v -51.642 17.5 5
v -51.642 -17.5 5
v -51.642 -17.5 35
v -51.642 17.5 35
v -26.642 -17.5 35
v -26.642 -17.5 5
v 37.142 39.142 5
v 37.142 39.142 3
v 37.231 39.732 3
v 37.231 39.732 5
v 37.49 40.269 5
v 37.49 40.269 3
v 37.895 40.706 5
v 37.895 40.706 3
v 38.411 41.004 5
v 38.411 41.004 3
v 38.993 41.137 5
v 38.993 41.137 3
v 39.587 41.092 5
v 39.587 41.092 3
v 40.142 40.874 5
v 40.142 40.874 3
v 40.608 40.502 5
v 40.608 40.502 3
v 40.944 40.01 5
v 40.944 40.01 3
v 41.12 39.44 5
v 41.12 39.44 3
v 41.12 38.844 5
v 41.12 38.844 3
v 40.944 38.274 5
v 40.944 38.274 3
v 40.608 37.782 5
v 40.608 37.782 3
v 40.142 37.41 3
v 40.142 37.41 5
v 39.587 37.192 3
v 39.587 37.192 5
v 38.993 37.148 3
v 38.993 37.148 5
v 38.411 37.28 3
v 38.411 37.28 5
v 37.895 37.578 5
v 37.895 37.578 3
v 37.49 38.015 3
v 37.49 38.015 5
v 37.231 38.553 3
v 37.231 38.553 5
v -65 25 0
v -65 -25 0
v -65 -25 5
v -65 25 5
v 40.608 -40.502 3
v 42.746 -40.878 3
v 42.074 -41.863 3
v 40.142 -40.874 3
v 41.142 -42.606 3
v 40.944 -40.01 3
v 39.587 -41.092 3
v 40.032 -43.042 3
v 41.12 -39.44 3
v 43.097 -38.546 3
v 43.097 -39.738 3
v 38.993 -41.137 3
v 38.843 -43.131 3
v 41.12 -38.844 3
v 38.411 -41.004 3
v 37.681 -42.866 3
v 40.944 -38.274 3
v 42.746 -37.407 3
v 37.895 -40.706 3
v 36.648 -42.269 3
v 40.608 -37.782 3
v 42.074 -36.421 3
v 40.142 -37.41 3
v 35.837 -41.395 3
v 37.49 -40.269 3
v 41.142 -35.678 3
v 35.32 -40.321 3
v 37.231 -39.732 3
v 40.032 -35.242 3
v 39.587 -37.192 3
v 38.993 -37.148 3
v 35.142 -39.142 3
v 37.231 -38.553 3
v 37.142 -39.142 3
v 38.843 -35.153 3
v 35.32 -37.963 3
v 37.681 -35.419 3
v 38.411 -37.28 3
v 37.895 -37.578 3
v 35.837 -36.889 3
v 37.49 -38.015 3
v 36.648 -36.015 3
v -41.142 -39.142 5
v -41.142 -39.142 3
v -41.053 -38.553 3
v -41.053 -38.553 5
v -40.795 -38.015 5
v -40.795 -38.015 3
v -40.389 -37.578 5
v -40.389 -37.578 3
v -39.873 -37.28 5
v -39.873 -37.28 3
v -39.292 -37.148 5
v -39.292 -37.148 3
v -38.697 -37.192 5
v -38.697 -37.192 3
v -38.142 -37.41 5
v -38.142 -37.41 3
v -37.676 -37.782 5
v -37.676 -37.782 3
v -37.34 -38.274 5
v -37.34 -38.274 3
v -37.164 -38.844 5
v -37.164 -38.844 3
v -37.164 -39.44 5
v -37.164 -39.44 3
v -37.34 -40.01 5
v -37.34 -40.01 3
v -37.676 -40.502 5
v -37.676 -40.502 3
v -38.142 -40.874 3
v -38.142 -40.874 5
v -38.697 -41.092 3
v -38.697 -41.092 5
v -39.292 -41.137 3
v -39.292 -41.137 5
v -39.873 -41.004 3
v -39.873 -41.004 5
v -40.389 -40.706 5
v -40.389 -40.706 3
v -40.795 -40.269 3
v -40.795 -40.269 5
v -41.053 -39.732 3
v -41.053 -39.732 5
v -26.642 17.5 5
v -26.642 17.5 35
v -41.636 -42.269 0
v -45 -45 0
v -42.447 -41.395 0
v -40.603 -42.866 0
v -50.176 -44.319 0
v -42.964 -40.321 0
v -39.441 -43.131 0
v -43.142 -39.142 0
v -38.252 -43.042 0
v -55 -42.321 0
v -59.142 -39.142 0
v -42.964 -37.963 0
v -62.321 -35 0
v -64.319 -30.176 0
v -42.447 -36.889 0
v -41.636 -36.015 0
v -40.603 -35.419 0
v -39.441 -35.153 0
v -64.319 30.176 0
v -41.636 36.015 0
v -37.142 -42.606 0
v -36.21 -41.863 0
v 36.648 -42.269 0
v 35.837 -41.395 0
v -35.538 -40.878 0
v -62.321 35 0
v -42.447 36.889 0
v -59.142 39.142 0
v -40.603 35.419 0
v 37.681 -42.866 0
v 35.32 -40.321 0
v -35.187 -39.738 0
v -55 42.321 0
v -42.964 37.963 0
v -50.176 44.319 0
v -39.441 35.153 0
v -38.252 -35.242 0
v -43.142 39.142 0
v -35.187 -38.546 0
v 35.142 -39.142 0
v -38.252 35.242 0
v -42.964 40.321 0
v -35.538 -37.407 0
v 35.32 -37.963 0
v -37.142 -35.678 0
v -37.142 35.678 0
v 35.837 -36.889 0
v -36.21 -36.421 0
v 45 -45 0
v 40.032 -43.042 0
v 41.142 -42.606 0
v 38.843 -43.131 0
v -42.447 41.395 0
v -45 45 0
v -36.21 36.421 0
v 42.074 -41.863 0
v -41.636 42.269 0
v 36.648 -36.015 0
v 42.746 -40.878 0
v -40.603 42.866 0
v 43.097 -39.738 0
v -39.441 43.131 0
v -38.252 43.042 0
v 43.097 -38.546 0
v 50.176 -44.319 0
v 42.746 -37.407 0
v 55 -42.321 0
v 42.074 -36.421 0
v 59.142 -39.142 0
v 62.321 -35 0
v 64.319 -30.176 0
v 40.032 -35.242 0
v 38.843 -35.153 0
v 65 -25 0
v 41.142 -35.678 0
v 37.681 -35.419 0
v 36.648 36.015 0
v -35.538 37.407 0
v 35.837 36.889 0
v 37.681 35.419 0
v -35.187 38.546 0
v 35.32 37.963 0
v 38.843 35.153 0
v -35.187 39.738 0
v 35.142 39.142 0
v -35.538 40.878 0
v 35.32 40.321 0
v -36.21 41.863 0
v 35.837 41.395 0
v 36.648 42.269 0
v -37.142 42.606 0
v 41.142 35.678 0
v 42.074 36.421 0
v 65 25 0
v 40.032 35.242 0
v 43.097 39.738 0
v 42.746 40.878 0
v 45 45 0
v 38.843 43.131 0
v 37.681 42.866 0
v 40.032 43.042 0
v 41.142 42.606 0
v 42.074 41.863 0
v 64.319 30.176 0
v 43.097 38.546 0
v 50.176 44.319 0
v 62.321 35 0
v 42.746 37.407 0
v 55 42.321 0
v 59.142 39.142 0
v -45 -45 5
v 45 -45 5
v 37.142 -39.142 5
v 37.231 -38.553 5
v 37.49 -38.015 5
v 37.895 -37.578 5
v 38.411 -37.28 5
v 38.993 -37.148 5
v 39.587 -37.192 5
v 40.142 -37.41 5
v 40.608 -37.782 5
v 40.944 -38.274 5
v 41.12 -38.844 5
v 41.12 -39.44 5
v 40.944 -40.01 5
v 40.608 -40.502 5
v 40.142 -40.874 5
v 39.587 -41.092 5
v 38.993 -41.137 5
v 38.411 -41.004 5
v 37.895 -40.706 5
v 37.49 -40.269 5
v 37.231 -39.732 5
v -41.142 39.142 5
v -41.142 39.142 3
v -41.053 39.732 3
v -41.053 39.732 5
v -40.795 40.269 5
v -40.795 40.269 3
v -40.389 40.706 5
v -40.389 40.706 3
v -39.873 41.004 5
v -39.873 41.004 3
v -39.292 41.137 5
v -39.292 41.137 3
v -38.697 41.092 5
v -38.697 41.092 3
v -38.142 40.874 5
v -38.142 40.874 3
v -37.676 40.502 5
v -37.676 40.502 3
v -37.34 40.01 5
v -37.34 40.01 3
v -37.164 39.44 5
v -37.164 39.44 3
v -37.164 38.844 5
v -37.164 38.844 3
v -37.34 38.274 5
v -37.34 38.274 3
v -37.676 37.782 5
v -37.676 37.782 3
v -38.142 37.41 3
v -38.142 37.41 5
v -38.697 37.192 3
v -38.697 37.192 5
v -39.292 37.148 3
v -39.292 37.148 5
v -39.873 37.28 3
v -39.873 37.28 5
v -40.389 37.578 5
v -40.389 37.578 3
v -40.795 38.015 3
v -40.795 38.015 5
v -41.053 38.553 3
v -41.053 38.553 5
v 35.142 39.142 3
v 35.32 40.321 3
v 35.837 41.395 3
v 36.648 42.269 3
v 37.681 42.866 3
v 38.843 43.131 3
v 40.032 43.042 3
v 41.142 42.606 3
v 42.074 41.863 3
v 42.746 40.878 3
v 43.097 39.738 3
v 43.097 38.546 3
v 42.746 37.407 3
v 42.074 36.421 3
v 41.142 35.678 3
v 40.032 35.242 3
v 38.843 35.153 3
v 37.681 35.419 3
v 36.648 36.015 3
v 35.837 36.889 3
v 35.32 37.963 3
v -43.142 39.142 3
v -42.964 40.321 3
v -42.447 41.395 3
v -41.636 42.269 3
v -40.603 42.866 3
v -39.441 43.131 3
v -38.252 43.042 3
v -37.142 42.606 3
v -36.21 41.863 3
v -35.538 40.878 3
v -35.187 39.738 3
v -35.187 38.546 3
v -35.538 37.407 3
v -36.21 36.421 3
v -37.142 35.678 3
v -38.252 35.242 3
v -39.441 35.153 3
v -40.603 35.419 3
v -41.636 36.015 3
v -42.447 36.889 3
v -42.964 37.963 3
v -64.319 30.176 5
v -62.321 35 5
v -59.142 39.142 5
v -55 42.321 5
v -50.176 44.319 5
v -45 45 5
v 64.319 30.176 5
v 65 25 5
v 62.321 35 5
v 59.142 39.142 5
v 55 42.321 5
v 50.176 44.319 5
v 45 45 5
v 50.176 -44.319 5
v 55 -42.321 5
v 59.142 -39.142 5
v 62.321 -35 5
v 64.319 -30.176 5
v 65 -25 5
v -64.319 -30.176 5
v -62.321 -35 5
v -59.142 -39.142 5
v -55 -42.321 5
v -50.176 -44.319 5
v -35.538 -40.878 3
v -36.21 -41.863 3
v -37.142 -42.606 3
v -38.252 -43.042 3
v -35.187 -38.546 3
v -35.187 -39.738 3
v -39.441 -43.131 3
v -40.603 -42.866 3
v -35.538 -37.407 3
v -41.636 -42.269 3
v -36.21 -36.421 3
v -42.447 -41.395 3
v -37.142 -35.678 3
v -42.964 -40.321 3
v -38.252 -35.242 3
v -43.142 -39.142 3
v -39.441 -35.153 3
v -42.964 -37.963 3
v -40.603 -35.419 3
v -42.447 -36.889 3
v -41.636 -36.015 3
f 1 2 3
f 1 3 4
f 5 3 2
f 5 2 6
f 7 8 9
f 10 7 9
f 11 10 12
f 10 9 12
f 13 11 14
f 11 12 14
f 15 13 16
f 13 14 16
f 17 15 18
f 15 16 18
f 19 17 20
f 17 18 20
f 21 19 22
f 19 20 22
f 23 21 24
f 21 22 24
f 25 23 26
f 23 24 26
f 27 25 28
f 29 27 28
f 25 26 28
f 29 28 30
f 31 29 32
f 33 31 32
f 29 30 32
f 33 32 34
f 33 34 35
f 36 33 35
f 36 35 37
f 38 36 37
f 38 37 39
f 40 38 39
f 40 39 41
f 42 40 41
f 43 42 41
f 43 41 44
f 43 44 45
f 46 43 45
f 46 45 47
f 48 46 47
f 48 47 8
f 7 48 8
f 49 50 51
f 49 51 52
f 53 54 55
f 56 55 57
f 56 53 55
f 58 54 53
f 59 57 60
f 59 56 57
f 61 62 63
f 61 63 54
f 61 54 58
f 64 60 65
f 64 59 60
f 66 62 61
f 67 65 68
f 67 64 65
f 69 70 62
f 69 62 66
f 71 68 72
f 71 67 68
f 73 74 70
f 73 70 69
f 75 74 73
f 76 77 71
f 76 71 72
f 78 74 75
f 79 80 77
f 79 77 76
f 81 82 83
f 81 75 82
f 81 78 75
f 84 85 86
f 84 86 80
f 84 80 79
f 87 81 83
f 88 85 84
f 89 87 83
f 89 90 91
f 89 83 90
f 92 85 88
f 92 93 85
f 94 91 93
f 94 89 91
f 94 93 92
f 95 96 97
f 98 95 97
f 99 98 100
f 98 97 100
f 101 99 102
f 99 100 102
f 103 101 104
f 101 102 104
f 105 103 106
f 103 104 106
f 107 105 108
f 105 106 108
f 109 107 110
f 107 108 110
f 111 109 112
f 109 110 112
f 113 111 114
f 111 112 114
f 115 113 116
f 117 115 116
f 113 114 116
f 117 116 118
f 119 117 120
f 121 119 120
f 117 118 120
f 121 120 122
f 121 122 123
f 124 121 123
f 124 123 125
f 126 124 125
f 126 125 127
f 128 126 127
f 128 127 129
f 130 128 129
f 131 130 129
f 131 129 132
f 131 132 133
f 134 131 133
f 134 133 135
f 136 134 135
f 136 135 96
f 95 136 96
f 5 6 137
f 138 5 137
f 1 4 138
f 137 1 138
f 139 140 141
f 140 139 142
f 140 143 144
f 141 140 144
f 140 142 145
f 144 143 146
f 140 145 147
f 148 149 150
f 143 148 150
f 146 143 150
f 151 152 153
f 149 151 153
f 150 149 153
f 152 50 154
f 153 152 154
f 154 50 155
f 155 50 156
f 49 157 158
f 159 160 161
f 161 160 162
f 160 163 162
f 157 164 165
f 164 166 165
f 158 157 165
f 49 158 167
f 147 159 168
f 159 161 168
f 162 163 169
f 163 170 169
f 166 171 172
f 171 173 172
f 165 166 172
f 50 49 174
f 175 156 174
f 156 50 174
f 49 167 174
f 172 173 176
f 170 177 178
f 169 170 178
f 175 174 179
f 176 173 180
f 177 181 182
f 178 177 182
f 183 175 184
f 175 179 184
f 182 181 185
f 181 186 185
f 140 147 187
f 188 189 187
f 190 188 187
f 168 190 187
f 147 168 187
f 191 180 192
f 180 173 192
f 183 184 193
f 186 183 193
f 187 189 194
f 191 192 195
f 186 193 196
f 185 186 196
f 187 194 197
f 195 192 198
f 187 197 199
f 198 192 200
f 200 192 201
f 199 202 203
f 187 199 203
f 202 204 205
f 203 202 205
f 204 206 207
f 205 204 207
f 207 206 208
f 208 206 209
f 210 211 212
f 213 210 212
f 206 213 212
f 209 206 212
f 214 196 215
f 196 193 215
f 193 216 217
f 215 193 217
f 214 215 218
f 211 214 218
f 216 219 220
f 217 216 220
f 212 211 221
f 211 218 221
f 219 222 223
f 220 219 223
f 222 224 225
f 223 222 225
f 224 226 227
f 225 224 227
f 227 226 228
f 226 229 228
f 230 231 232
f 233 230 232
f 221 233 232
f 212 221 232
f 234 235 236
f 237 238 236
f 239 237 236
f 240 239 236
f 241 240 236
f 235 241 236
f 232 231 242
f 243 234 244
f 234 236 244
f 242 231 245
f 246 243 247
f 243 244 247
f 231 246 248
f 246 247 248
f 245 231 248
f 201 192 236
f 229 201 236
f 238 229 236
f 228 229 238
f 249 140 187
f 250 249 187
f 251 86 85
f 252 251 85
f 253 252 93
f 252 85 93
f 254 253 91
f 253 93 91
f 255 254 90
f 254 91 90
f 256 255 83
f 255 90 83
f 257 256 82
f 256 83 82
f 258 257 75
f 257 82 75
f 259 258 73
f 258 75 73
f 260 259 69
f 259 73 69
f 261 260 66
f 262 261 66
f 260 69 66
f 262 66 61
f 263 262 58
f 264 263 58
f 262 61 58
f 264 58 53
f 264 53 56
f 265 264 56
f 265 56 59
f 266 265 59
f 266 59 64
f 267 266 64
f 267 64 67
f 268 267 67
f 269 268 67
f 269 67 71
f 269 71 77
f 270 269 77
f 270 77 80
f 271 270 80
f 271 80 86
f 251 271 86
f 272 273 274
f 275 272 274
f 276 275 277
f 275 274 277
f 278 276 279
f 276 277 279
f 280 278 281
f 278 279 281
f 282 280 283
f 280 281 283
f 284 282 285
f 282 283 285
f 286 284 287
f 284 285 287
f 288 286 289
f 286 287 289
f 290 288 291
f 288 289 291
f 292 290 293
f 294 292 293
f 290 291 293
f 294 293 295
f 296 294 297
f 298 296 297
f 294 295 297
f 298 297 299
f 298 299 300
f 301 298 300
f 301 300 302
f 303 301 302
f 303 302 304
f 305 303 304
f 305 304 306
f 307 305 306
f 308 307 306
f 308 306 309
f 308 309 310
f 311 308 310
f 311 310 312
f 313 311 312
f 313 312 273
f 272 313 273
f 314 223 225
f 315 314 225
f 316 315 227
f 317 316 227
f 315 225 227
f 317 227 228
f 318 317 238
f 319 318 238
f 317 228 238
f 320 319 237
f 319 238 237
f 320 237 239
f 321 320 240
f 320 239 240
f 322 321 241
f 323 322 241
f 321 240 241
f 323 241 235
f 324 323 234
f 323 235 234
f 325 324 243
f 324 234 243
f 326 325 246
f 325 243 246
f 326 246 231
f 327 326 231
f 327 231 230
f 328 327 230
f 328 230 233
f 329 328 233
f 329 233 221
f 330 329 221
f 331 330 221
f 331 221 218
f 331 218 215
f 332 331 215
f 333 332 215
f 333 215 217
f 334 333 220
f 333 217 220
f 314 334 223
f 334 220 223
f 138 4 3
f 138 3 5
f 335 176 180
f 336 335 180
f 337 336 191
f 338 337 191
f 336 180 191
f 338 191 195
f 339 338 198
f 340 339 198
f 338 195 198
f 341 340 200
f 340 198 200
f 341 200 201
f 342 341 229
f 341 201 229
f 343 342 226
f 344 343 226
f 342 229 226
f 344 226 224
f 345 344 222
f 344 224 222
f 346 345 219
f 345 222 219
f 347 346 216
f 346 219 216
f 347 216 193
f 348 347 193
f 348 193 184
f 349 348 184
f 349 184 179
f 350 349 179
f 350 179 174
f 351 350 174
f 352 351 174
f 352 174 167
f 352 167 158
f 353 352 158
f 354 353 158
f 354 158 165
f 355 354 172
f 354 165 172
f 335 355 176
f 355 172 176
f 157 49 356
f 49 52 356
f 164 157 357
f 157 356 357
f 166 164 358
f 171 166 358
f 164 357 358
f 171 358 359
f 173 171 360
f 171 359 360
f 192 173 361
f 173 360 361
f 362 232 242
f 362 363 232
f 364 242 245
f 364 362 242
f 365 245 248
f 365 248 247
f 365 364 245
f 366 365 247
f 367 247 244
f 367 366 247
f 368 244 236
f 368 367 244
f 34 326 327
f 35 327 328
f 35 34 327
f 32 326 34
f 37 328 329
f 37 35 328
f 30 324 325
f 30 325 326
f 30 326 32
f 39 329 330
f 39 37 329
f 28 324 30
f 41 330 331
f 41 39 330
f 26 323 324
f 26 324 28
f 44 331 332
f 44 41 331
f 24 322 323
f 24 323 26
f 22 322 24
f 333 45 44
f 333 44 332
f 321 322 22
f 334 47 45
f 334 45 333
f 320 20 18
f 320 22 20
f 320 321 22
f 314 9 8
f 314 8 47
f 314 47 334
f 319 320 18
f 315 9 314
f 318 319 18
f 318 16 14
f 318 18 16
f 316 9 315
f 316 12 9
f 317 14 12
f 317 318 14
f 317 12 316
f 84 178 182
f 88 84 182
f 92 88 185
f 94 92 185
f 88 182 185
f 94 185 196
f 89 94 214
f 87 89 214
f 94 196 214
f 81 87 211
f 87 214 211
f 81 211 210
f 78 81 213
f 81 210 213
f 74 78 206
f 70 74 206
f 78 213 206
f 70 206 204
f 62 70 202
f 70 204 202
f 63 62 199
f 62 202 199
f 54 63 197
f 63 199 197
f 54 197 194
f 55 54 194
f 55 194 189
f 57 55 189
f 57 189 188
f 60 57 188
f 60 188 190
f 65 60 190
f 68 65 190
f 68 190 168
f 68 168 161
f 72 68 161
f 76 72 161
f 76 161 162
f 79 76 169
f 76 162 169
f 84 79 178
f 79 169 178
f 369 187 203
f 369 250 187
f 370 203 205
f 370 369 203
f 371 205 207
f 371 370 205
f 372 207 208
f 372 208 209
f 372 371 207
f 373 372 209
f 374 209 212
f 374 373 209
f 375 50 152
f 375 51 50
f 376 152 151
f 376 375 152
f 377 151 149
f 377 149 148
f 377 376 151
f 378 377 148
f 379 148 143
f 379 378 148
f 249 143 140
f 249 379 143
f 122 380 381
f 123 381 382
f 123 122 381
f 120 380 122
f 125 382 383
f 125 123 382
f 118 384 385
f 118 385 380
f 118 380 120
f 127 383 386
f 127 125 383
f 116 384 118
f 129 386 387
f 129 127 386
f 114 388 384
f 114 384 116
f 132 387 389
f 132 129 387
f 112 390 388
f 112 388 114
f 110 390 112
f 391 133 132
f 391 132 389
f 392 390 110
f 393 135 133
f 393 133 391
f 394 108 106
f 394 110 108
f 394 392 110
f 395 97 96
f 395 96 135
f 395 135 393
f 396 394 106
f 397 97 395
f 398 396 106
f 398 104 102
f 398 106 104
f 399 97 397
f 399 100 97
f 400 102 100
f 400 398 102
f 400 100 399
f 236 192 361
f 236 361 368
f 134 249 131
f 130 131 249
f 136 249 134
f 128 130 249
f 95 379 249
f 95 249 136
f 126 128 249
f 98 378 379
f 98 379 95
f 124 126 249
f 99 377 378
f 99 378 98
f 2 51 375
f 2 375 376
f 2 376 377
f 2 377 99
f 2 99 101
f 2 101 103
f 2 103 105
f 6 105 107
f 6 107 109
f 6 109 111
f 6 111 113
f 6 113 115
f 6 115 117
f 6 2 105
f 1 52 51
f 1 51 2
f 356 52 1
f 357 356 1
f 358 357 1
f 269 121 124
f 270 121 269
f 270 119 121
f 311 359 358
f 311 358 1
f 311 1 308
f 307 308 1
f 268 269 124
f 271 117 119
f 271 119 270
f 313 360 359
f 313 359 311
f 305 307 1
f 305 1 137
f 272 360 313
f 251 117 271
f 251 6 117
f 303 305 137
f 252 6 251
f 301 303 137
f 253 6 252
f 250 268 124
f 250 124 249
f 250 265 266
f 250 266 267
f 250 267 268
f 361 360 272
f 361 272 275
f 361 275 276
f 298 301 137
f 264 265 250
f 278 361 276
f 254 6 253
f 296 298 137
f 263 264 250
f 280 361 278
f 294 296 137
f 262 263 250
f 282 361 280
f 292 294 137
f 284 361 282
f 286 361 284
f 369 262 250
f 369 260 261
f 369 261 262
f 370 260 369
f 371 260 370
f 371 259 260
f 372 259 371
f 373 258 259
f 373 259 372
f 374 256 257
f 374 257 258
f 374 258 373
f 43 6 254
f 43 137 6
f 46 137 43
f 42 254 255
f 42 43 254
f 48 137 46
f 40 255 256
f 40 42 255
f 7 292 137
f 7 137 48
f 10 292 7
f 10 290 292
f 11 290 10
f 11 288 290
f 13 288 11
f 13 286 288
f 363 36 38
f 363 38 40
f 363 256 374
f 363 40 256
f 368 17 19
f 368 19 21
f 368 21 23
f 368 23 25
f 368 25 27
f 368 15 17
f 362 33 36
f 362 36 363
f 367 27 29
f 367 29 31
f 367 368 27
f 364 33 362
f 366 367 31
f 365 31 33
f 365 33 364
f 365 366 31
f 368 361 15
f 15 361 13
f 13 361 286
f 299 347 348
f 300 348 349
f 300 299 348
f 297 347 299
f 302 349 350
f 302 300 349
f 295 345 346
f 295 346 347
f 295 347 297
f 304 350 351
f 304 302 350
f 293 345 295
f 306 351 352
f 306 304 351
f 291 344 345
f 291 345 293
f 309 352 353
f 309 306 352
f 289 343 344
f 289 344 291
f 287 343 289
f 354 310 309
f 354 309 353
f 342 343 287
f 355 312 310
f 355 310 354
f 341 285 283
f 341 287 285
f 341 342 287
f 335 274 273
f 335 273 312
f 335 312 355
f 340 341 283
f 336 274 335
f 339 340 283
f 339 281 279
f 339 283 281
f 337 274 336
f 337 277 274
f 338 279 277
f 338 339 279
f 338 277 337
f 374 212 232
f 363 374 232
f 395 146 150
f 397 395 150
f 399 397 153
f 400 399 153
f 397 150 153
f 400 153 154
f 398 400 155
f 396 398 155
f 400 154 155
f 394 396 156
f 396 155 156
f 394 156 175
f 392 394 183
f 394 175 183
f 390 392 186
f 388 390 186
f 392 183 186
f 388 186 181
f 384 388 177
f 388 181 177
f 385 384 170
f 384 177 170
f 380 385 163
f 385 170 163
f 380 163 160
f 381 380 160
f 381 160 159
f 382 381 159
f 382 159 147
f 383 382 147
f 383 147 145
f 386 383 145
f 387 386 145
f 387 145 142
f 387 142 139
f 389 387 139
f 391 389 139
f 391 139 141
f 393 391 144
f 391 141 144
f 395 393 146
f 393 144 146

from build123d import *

# Parameters (mm, degrees)
SKETCH1_W           = 130
SKETCH1_H           = 90
BOSS_EXTRUDE1_DEPTH = 5
FILLET1_R           = 20
SKETCH2_R           = 4
CUT_EXTRUDE1_DEPTH  = 3
SKETCH3_R           = 2
CUT_EXTRUDE2_DEPTH  = 6
SKETCH4_W           = 25
SKETCH4_H           = 35
BOSS_EXTRUDE2_DEPTH = 30


with BuildPart() as part:
    # Sketch1 → Boss-Extrude1 (new body)
    with BuildSketch(Plane.XY):
        Rectangle(SKETCH1_W, SKETCH1_H)
    extrude(amount=BOSS_EXTRUDE1_DEPTH)

    # Fillet1
    fillet1_edges = [part.edges().sort_by_distance(p)[0] for p in [
        (65, -45, 2.5),
        (-65, -45, 2.5),
        (-65, 45, 2.5),
        (65, 45, 2.5),
    ]]
    fillet(fillet1_edges, radius=FILLET1_R)

    # Sketch2 → Cut-Extrude1 (cut)
    with BuildSketch(Plane(origin=(0, 0, 0), x_dir=(-1, 0, 0), z_dir=(0, 0, -1))):
        with Locations((-39.142135624, 39.142135624)):
            Circle(SKETCH2_R)
        with Locations((39.142135624, 39.142135624)):
            Circle(SKETCH2_R)
        with Locations((-39.142135624, -39.142135624)):
            Circle(SKETCH2_R)
        with Locations((39.142135624, -39.142135624)):
            Circle(SKETCH2_R)
    extrude(amount=-CUT_EXTRUDE1_DEPTH, mode=Mode.SUBTRACT)

    # Sketch3 → Cut-Extrude2 (cut, through all)
    with BuildSketch(Plane(origin=(0, 0, 0), x_dir=(-1, 0, 0), z_dir=(0, 0, -1))):
        with Locations((-39.142135624, 39.142135624)):
            Circle(SKETCH3_R)
        with Locations((39.142135624, 39.142135624)):
            Circle(SKETCH3_R)
        with Locations((39.142135624, -39.142135624)):
            Circle(SKETCH3_R)
        with Locations((-39.142135624, -39.142135624)):
            Circle(SKETCH3_R)
    extrude(amount=-CUT_EXTRUDE2_DEPTH, mode=Mode.SUBTRACT)

    # Sketch4 → Boss-Extrude2 (add)
    with BuildSketch(Plane.XY.offset(5)):
        with Locations((-39.142135624, 0)):
            Rectangle(SKETCH4_W, SKETCH4_H)
    extrude(amount=BOSS_EXTRUDE2_DEPTH)


solid = part.part
